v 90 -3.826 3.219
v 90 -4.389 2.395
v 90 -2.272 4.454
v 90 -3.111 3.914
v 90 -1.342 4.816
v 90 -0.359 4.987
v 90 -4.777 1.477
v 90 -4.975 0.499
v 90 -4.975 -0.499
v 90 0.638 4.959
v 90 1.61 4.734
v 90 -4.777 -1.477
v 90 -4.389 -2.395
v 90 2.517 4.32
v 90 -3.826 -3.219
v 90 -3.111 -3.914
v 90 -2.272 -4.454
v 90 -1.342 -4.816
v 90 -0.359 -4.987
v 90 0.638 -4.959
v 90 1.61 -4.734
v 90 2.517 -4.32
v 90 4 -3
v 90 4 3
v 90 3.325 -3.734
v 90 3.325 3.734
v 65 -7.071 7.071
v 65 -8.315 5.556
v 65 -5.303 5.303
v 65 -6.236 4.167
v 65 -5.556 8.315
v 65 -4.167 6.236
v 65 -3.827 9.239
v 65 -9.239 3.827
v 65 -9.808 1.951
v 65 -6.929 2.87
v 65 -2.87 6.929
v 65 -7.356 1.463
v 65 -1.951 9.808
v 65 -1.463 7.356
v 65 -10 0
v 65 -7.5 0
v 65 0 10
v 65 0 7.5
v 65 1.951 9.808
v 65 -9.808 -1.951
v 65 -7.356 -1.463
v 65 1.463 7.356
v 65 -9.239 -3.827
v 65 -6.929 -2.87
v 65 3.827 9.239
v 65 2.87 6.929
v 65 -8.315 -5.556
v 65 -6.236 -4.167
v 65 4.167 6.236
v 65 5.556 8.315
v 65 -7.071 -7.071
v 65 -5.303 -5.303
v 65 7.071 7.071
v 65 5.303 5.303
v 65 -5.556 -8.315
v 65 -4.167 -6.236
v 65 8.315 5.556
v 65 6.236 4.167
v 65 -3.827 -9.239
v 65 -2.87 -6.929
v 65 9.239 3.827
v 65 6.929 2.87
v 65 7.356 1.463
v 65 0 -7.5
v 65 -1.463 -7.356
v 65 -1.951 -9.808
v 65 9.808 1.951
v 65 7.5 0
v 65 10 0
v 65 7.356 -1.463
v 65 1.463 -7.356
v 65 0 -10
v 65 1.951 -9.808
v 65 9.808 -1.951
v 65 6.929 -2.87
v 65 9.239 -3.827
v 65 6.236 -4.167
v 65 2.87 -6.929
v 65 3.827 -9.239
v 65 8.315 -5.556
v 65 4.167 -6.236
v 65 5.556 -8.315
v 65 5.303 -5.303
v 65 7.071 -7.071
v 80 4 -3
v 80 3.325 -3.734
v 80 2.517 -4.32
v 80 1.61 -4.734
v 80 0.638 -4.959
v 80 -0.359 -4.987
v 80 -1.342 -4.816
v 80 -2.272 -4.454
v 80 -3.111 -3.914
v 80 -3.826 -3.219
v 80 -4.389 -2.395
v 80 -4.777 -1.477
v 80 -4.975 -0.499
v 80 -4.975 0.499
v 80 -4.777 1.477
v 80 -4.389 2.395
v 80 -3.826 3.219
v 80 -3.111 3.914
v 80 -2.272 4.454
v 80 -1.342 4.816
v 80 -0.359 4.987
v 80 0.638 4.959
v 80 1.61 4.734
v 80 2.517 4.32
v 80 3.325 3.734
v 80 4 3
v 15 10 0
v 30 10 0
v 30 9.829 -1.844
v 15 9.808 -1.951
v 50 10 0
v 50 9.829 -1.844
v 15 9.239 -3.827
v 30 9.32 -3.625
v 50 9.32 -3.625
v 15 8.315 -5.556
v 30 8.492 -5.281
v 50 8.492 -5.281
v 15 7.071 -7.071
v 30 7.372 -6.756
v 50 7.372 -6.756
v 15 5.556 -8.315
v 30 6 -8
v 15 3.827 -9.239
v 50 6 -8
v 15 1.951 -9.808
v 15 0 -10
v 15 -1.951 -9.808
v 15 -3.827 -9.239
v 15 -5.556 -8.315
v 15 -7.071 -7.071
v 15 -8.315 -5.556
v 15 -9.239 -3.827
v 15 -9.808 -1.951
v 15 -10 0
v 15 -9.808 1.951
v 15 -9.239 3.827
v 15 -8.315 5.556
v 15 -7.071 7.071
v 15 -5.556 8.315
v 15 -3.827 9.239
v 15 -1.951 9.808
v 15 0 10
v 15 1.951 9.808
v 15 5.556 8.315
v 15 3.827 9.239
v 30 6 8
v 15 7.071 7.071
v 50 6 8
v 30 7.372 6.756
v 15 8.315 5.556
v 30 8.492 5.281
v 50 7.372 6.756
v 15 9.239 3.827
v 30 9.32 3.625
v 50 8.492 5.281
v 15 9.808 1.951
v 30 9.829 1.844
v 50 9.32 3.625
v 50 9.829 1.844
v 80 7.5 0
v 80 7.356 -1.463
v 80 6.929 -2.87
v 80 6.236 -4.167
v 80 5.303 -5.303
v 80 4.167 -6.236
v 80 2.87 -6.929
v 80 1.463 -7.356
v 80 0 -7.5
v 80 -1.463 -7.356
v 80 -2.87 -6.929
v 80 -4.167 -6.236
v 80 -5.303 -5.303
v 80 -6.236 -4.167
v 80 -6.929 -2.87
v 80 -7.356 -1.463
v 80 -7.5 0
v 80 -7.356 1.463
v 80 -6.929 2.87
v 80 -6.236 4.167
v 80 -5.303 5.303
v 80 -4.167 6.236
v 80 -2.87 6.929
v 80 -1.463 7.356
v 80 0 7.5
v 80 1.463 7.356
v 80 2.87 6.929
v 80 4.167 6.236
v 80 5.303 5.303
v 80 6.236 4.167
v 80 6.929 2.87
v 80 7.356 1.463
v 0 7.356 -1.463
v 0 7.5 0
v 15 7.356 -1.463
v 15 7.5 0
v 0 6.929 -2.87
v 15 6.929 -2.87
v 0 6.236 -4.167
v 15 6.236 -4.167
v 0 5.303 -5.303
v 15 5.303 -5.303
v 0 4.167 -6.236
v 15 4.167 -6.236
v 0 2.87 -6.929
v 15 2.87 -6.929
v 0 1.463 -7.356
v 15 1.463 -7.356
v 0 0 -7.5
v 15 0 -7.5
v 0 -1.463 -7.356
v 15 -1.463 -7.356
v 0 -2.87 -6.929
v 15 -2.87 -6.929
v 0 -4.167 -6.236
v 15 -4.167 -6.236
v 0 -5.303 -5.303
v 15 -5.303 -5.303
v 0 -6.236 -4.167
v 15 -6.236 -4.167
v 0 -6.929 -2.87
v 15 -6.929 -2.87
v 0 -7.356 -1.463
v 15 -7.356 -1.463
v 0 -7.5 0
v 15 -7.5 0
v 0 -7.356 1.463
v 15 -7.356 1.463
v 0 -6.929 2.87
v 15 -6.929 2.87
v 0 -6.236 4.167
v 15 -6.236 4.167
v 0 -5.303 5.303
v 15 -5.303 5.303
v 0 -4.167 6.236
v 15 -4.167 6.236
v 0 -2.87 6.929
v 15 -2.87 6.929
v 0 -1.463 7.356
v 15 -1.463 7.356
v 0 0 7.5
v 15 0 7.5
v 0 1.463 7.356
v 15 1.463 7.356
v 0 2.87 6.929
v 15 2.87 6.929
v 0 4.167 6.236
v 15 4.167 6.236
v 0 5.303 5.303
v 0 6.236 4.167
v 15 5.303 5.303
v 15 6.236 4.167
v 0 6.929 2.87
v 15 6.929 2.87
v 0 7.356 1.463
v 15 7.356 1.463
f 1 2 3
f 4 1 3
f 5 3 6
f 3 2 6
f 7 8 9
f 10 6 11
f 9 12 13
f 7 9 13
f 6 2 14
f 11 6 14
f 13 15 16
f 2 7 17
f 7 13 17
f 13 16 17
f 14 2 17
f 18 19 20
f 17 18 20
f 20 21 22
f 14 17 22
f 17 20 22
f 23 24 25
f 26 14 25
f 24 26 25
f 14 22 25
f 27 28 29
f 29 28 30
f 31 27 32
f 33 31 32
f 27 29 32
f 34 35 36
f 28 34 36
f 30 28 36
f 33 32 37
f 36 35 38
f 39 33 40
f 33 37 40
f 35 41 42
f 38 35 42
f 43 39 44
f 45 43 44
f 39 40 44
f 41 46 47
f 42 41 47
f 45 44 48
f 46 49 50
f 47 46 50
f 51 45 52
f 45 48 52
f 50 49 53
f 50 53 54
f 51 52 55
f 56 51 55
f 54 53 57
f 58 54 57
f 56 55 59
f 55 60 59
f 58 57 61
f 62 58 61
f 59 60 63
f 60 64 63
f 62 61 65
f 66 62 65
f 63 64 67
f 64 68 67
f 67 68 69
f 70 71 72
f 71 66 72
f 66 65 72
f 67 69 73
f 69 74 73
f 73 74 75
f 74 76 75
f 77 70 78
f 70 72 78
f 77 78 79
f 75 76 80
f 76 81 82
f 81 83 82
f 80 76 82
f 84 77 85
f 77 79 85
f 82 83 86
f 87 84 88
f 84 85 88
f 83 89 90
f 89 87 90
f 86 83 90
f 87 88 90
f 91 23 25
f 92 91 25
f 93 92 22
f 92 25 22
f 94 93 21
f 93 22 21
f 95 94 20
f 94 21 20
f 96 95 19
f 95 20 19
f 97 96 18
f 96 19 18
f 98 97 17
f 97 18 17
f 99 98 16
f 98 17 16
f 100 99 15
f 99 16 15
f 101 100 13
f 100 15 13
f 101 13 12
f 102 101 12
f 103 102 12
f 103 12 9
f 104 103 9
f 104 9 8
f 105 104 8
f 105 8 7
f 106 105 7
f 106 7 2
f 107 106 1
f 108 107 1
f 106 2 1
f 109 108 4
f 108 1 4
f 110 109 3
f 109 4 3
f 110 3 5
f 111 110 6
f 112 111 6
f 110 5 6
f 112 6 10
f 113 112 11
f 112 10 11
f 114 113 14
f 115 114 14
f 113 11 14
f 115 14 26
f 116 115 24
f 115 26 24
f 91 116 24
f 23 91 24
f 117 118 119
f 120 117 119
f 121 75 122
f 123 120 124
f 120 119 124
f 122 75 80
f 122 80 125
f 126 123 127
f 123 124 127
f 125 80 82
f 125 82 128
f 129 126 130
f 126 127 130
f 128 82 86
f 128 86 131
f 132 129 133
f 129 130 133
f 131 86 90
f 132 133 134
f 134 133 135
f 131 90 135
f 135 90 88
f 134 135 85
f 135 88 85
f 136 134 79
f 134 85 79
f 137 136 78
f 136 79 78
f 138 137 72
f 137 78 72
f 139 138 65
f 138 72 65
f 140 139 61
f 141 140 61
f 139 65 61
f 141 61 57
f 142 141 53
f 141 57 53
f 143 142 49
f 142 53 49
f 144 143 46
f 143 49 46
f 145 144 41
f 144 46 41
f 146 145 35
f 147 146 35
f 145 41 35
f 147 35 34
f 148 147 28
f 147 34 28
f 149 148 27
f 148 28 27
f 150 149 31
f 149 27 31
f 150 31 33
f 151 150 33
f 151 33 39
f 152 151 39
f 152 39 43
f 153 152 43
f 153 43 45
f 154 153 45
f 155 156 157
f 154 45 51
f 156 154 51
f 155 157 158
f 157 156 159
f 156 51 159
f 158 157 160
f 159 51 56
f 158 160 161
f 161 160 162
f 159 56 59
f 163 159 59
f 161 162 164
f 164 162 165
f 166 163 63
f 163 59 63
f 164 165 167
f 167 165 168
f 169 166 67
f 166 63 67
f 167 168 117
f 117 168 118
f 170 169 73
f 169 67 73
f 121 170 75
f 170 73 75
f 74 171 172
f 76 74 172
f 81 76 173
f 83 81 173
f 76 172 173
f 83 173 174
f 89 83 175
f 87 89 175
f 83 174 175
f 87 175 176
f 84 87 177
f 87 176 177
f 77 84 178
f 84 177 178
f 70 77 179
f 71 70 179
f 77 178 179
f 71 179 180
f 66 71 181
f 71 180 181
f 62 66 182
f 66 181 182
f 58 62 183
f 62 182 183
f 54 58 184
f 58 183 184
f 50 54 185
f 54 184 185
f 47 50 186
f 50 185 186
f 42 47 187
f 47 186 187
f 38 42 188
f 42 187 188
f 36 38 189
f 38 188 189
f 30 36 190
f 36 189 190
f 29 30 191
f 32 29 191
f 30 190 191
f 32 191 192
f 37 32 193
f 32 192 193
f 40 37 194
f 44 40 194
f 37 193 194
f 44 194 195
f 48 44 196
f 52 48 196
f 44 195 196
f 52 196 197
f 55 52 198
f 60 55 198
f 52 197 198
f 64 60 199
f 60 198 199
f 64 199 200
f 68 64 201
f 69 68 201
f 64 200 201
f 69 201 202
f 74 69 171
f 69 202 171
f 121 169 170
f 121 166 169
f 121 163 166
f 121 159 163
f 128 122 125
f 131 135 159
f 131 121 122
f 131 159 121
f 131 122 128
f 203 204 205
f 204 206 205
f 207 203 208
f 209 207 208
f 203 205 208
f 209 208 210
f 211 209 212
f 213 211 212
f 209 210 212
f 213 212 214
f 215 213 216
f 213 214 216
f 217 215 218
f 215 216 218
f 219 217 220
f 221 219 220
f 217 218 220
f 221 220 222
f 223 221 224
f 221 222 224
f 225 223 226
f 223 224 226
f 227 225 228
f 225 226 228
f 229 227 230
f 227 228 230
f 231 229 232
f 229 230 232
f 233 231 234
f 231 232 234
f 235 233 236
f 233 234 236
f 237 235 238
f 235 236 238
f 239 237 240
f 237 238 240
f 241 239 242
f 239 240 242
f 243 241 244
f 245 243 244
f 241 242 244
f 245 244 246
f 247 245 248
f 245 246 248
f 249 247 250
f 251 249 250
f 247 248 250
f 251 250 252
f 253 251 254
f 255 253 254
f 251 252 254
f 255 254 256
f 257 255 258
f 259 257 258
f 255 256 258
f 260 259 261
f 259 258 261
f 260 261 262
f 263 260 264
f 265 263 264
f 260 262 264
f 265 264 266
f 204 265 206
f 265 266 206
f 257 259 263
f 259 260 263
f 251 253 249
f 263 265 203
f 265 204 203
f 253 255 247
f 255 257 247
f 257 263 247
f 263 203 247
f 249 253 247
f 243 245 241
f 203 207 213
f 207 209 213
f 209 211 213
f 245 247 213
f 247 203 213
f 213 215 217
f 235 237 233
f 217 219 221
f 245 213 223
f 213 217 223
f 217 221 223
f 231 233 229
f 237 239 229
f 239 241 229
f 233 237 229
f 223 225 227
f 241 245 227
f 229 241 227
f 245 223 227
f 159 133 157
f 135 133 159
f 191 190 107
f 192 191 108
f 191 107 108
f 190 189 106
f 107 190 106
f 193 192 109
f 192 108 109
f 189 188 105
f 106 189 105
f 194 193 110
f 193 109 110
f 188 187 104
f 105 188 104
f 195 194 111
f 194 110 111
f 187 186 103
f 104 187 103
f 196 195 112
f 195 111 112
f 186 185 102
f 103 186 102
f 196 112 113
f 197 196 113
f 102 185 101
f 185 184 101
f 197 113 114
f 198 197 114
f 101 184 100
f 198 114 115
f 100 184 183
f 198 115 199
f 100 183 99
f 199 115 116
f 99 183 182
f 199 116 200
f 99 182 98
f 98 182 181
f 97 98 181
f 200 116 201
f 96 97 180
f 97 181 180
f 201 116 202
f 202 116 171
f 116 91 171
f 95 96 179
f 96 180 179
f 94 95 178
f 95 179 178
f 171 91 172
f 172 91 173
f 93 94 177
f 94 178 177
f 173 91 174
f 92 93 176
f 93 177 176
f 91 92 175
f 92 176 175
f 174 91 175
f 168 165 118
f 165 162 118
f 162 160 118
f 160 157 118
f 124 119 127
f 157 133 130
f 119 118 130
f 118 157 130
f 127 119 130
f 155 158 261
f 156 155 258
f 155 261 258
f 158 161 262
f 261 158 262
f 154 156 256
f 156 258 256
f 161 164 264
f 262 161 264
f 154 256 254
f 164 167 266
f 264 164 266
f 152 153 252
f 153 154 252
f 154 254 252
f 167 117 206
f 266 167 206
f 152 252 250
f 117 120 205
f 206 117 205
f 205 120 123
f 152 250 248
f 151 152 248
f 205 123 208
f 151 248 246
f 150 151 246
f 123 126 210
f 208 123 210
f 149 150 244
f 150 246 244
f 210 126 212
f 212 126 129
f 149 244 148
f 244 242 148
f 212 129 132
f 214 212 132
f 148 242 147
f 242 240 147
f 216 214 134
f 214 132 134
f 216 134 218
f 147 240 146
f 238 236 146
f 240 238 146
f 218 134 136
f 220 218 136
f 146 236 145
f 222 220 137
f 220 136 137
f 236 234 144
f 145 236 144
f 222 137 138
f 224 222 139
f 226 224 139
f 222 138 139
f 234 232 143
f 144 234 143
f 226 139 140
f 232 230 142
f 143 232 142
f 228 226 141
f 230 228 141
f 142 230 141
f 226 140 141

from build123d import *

# Parameters (mm, degrees)
IZIM3_W               = 20
IZIM3_H               = 8.956518763
IZIM3_W_2             = 16.233107577
IZIM3_H_2             = 7.025571552
KES_EKSTR_ZYON1_DEPTH = 30


with BuildPart() as part:
    # Çizim1 → Döndür2 (revolve)
    with BuildSketch(Plane.XY):
        Polygon((0, 0), (0, 7.5), (15, 7.5), (15, 10), (65, 10), (65, 7.5), (80, 7.5), (80, 5), (90, 5), (90, 0), align=None)
    revolve(axis=Axis((90, 0, 0), (-1, 0, 0)))

    # Çizim3 → Kes-Ekstrüzyon1 (cut, symmetric)
    with BuildSketch(Plane.XY):
        with Locations((40, 10.478259381)):
            Rectangle(IZIM3_W, IZIM3_H)
        with Locations((88.116553788, 7.512785776)):
            Rectangle(IZIM3_W_2, IZIM3_H_2)
    extrude(amount=KES_EKSTR_ZYON1_DEPTH, both=True, mode=Mode.SUBTRACT)


solid = part.part
